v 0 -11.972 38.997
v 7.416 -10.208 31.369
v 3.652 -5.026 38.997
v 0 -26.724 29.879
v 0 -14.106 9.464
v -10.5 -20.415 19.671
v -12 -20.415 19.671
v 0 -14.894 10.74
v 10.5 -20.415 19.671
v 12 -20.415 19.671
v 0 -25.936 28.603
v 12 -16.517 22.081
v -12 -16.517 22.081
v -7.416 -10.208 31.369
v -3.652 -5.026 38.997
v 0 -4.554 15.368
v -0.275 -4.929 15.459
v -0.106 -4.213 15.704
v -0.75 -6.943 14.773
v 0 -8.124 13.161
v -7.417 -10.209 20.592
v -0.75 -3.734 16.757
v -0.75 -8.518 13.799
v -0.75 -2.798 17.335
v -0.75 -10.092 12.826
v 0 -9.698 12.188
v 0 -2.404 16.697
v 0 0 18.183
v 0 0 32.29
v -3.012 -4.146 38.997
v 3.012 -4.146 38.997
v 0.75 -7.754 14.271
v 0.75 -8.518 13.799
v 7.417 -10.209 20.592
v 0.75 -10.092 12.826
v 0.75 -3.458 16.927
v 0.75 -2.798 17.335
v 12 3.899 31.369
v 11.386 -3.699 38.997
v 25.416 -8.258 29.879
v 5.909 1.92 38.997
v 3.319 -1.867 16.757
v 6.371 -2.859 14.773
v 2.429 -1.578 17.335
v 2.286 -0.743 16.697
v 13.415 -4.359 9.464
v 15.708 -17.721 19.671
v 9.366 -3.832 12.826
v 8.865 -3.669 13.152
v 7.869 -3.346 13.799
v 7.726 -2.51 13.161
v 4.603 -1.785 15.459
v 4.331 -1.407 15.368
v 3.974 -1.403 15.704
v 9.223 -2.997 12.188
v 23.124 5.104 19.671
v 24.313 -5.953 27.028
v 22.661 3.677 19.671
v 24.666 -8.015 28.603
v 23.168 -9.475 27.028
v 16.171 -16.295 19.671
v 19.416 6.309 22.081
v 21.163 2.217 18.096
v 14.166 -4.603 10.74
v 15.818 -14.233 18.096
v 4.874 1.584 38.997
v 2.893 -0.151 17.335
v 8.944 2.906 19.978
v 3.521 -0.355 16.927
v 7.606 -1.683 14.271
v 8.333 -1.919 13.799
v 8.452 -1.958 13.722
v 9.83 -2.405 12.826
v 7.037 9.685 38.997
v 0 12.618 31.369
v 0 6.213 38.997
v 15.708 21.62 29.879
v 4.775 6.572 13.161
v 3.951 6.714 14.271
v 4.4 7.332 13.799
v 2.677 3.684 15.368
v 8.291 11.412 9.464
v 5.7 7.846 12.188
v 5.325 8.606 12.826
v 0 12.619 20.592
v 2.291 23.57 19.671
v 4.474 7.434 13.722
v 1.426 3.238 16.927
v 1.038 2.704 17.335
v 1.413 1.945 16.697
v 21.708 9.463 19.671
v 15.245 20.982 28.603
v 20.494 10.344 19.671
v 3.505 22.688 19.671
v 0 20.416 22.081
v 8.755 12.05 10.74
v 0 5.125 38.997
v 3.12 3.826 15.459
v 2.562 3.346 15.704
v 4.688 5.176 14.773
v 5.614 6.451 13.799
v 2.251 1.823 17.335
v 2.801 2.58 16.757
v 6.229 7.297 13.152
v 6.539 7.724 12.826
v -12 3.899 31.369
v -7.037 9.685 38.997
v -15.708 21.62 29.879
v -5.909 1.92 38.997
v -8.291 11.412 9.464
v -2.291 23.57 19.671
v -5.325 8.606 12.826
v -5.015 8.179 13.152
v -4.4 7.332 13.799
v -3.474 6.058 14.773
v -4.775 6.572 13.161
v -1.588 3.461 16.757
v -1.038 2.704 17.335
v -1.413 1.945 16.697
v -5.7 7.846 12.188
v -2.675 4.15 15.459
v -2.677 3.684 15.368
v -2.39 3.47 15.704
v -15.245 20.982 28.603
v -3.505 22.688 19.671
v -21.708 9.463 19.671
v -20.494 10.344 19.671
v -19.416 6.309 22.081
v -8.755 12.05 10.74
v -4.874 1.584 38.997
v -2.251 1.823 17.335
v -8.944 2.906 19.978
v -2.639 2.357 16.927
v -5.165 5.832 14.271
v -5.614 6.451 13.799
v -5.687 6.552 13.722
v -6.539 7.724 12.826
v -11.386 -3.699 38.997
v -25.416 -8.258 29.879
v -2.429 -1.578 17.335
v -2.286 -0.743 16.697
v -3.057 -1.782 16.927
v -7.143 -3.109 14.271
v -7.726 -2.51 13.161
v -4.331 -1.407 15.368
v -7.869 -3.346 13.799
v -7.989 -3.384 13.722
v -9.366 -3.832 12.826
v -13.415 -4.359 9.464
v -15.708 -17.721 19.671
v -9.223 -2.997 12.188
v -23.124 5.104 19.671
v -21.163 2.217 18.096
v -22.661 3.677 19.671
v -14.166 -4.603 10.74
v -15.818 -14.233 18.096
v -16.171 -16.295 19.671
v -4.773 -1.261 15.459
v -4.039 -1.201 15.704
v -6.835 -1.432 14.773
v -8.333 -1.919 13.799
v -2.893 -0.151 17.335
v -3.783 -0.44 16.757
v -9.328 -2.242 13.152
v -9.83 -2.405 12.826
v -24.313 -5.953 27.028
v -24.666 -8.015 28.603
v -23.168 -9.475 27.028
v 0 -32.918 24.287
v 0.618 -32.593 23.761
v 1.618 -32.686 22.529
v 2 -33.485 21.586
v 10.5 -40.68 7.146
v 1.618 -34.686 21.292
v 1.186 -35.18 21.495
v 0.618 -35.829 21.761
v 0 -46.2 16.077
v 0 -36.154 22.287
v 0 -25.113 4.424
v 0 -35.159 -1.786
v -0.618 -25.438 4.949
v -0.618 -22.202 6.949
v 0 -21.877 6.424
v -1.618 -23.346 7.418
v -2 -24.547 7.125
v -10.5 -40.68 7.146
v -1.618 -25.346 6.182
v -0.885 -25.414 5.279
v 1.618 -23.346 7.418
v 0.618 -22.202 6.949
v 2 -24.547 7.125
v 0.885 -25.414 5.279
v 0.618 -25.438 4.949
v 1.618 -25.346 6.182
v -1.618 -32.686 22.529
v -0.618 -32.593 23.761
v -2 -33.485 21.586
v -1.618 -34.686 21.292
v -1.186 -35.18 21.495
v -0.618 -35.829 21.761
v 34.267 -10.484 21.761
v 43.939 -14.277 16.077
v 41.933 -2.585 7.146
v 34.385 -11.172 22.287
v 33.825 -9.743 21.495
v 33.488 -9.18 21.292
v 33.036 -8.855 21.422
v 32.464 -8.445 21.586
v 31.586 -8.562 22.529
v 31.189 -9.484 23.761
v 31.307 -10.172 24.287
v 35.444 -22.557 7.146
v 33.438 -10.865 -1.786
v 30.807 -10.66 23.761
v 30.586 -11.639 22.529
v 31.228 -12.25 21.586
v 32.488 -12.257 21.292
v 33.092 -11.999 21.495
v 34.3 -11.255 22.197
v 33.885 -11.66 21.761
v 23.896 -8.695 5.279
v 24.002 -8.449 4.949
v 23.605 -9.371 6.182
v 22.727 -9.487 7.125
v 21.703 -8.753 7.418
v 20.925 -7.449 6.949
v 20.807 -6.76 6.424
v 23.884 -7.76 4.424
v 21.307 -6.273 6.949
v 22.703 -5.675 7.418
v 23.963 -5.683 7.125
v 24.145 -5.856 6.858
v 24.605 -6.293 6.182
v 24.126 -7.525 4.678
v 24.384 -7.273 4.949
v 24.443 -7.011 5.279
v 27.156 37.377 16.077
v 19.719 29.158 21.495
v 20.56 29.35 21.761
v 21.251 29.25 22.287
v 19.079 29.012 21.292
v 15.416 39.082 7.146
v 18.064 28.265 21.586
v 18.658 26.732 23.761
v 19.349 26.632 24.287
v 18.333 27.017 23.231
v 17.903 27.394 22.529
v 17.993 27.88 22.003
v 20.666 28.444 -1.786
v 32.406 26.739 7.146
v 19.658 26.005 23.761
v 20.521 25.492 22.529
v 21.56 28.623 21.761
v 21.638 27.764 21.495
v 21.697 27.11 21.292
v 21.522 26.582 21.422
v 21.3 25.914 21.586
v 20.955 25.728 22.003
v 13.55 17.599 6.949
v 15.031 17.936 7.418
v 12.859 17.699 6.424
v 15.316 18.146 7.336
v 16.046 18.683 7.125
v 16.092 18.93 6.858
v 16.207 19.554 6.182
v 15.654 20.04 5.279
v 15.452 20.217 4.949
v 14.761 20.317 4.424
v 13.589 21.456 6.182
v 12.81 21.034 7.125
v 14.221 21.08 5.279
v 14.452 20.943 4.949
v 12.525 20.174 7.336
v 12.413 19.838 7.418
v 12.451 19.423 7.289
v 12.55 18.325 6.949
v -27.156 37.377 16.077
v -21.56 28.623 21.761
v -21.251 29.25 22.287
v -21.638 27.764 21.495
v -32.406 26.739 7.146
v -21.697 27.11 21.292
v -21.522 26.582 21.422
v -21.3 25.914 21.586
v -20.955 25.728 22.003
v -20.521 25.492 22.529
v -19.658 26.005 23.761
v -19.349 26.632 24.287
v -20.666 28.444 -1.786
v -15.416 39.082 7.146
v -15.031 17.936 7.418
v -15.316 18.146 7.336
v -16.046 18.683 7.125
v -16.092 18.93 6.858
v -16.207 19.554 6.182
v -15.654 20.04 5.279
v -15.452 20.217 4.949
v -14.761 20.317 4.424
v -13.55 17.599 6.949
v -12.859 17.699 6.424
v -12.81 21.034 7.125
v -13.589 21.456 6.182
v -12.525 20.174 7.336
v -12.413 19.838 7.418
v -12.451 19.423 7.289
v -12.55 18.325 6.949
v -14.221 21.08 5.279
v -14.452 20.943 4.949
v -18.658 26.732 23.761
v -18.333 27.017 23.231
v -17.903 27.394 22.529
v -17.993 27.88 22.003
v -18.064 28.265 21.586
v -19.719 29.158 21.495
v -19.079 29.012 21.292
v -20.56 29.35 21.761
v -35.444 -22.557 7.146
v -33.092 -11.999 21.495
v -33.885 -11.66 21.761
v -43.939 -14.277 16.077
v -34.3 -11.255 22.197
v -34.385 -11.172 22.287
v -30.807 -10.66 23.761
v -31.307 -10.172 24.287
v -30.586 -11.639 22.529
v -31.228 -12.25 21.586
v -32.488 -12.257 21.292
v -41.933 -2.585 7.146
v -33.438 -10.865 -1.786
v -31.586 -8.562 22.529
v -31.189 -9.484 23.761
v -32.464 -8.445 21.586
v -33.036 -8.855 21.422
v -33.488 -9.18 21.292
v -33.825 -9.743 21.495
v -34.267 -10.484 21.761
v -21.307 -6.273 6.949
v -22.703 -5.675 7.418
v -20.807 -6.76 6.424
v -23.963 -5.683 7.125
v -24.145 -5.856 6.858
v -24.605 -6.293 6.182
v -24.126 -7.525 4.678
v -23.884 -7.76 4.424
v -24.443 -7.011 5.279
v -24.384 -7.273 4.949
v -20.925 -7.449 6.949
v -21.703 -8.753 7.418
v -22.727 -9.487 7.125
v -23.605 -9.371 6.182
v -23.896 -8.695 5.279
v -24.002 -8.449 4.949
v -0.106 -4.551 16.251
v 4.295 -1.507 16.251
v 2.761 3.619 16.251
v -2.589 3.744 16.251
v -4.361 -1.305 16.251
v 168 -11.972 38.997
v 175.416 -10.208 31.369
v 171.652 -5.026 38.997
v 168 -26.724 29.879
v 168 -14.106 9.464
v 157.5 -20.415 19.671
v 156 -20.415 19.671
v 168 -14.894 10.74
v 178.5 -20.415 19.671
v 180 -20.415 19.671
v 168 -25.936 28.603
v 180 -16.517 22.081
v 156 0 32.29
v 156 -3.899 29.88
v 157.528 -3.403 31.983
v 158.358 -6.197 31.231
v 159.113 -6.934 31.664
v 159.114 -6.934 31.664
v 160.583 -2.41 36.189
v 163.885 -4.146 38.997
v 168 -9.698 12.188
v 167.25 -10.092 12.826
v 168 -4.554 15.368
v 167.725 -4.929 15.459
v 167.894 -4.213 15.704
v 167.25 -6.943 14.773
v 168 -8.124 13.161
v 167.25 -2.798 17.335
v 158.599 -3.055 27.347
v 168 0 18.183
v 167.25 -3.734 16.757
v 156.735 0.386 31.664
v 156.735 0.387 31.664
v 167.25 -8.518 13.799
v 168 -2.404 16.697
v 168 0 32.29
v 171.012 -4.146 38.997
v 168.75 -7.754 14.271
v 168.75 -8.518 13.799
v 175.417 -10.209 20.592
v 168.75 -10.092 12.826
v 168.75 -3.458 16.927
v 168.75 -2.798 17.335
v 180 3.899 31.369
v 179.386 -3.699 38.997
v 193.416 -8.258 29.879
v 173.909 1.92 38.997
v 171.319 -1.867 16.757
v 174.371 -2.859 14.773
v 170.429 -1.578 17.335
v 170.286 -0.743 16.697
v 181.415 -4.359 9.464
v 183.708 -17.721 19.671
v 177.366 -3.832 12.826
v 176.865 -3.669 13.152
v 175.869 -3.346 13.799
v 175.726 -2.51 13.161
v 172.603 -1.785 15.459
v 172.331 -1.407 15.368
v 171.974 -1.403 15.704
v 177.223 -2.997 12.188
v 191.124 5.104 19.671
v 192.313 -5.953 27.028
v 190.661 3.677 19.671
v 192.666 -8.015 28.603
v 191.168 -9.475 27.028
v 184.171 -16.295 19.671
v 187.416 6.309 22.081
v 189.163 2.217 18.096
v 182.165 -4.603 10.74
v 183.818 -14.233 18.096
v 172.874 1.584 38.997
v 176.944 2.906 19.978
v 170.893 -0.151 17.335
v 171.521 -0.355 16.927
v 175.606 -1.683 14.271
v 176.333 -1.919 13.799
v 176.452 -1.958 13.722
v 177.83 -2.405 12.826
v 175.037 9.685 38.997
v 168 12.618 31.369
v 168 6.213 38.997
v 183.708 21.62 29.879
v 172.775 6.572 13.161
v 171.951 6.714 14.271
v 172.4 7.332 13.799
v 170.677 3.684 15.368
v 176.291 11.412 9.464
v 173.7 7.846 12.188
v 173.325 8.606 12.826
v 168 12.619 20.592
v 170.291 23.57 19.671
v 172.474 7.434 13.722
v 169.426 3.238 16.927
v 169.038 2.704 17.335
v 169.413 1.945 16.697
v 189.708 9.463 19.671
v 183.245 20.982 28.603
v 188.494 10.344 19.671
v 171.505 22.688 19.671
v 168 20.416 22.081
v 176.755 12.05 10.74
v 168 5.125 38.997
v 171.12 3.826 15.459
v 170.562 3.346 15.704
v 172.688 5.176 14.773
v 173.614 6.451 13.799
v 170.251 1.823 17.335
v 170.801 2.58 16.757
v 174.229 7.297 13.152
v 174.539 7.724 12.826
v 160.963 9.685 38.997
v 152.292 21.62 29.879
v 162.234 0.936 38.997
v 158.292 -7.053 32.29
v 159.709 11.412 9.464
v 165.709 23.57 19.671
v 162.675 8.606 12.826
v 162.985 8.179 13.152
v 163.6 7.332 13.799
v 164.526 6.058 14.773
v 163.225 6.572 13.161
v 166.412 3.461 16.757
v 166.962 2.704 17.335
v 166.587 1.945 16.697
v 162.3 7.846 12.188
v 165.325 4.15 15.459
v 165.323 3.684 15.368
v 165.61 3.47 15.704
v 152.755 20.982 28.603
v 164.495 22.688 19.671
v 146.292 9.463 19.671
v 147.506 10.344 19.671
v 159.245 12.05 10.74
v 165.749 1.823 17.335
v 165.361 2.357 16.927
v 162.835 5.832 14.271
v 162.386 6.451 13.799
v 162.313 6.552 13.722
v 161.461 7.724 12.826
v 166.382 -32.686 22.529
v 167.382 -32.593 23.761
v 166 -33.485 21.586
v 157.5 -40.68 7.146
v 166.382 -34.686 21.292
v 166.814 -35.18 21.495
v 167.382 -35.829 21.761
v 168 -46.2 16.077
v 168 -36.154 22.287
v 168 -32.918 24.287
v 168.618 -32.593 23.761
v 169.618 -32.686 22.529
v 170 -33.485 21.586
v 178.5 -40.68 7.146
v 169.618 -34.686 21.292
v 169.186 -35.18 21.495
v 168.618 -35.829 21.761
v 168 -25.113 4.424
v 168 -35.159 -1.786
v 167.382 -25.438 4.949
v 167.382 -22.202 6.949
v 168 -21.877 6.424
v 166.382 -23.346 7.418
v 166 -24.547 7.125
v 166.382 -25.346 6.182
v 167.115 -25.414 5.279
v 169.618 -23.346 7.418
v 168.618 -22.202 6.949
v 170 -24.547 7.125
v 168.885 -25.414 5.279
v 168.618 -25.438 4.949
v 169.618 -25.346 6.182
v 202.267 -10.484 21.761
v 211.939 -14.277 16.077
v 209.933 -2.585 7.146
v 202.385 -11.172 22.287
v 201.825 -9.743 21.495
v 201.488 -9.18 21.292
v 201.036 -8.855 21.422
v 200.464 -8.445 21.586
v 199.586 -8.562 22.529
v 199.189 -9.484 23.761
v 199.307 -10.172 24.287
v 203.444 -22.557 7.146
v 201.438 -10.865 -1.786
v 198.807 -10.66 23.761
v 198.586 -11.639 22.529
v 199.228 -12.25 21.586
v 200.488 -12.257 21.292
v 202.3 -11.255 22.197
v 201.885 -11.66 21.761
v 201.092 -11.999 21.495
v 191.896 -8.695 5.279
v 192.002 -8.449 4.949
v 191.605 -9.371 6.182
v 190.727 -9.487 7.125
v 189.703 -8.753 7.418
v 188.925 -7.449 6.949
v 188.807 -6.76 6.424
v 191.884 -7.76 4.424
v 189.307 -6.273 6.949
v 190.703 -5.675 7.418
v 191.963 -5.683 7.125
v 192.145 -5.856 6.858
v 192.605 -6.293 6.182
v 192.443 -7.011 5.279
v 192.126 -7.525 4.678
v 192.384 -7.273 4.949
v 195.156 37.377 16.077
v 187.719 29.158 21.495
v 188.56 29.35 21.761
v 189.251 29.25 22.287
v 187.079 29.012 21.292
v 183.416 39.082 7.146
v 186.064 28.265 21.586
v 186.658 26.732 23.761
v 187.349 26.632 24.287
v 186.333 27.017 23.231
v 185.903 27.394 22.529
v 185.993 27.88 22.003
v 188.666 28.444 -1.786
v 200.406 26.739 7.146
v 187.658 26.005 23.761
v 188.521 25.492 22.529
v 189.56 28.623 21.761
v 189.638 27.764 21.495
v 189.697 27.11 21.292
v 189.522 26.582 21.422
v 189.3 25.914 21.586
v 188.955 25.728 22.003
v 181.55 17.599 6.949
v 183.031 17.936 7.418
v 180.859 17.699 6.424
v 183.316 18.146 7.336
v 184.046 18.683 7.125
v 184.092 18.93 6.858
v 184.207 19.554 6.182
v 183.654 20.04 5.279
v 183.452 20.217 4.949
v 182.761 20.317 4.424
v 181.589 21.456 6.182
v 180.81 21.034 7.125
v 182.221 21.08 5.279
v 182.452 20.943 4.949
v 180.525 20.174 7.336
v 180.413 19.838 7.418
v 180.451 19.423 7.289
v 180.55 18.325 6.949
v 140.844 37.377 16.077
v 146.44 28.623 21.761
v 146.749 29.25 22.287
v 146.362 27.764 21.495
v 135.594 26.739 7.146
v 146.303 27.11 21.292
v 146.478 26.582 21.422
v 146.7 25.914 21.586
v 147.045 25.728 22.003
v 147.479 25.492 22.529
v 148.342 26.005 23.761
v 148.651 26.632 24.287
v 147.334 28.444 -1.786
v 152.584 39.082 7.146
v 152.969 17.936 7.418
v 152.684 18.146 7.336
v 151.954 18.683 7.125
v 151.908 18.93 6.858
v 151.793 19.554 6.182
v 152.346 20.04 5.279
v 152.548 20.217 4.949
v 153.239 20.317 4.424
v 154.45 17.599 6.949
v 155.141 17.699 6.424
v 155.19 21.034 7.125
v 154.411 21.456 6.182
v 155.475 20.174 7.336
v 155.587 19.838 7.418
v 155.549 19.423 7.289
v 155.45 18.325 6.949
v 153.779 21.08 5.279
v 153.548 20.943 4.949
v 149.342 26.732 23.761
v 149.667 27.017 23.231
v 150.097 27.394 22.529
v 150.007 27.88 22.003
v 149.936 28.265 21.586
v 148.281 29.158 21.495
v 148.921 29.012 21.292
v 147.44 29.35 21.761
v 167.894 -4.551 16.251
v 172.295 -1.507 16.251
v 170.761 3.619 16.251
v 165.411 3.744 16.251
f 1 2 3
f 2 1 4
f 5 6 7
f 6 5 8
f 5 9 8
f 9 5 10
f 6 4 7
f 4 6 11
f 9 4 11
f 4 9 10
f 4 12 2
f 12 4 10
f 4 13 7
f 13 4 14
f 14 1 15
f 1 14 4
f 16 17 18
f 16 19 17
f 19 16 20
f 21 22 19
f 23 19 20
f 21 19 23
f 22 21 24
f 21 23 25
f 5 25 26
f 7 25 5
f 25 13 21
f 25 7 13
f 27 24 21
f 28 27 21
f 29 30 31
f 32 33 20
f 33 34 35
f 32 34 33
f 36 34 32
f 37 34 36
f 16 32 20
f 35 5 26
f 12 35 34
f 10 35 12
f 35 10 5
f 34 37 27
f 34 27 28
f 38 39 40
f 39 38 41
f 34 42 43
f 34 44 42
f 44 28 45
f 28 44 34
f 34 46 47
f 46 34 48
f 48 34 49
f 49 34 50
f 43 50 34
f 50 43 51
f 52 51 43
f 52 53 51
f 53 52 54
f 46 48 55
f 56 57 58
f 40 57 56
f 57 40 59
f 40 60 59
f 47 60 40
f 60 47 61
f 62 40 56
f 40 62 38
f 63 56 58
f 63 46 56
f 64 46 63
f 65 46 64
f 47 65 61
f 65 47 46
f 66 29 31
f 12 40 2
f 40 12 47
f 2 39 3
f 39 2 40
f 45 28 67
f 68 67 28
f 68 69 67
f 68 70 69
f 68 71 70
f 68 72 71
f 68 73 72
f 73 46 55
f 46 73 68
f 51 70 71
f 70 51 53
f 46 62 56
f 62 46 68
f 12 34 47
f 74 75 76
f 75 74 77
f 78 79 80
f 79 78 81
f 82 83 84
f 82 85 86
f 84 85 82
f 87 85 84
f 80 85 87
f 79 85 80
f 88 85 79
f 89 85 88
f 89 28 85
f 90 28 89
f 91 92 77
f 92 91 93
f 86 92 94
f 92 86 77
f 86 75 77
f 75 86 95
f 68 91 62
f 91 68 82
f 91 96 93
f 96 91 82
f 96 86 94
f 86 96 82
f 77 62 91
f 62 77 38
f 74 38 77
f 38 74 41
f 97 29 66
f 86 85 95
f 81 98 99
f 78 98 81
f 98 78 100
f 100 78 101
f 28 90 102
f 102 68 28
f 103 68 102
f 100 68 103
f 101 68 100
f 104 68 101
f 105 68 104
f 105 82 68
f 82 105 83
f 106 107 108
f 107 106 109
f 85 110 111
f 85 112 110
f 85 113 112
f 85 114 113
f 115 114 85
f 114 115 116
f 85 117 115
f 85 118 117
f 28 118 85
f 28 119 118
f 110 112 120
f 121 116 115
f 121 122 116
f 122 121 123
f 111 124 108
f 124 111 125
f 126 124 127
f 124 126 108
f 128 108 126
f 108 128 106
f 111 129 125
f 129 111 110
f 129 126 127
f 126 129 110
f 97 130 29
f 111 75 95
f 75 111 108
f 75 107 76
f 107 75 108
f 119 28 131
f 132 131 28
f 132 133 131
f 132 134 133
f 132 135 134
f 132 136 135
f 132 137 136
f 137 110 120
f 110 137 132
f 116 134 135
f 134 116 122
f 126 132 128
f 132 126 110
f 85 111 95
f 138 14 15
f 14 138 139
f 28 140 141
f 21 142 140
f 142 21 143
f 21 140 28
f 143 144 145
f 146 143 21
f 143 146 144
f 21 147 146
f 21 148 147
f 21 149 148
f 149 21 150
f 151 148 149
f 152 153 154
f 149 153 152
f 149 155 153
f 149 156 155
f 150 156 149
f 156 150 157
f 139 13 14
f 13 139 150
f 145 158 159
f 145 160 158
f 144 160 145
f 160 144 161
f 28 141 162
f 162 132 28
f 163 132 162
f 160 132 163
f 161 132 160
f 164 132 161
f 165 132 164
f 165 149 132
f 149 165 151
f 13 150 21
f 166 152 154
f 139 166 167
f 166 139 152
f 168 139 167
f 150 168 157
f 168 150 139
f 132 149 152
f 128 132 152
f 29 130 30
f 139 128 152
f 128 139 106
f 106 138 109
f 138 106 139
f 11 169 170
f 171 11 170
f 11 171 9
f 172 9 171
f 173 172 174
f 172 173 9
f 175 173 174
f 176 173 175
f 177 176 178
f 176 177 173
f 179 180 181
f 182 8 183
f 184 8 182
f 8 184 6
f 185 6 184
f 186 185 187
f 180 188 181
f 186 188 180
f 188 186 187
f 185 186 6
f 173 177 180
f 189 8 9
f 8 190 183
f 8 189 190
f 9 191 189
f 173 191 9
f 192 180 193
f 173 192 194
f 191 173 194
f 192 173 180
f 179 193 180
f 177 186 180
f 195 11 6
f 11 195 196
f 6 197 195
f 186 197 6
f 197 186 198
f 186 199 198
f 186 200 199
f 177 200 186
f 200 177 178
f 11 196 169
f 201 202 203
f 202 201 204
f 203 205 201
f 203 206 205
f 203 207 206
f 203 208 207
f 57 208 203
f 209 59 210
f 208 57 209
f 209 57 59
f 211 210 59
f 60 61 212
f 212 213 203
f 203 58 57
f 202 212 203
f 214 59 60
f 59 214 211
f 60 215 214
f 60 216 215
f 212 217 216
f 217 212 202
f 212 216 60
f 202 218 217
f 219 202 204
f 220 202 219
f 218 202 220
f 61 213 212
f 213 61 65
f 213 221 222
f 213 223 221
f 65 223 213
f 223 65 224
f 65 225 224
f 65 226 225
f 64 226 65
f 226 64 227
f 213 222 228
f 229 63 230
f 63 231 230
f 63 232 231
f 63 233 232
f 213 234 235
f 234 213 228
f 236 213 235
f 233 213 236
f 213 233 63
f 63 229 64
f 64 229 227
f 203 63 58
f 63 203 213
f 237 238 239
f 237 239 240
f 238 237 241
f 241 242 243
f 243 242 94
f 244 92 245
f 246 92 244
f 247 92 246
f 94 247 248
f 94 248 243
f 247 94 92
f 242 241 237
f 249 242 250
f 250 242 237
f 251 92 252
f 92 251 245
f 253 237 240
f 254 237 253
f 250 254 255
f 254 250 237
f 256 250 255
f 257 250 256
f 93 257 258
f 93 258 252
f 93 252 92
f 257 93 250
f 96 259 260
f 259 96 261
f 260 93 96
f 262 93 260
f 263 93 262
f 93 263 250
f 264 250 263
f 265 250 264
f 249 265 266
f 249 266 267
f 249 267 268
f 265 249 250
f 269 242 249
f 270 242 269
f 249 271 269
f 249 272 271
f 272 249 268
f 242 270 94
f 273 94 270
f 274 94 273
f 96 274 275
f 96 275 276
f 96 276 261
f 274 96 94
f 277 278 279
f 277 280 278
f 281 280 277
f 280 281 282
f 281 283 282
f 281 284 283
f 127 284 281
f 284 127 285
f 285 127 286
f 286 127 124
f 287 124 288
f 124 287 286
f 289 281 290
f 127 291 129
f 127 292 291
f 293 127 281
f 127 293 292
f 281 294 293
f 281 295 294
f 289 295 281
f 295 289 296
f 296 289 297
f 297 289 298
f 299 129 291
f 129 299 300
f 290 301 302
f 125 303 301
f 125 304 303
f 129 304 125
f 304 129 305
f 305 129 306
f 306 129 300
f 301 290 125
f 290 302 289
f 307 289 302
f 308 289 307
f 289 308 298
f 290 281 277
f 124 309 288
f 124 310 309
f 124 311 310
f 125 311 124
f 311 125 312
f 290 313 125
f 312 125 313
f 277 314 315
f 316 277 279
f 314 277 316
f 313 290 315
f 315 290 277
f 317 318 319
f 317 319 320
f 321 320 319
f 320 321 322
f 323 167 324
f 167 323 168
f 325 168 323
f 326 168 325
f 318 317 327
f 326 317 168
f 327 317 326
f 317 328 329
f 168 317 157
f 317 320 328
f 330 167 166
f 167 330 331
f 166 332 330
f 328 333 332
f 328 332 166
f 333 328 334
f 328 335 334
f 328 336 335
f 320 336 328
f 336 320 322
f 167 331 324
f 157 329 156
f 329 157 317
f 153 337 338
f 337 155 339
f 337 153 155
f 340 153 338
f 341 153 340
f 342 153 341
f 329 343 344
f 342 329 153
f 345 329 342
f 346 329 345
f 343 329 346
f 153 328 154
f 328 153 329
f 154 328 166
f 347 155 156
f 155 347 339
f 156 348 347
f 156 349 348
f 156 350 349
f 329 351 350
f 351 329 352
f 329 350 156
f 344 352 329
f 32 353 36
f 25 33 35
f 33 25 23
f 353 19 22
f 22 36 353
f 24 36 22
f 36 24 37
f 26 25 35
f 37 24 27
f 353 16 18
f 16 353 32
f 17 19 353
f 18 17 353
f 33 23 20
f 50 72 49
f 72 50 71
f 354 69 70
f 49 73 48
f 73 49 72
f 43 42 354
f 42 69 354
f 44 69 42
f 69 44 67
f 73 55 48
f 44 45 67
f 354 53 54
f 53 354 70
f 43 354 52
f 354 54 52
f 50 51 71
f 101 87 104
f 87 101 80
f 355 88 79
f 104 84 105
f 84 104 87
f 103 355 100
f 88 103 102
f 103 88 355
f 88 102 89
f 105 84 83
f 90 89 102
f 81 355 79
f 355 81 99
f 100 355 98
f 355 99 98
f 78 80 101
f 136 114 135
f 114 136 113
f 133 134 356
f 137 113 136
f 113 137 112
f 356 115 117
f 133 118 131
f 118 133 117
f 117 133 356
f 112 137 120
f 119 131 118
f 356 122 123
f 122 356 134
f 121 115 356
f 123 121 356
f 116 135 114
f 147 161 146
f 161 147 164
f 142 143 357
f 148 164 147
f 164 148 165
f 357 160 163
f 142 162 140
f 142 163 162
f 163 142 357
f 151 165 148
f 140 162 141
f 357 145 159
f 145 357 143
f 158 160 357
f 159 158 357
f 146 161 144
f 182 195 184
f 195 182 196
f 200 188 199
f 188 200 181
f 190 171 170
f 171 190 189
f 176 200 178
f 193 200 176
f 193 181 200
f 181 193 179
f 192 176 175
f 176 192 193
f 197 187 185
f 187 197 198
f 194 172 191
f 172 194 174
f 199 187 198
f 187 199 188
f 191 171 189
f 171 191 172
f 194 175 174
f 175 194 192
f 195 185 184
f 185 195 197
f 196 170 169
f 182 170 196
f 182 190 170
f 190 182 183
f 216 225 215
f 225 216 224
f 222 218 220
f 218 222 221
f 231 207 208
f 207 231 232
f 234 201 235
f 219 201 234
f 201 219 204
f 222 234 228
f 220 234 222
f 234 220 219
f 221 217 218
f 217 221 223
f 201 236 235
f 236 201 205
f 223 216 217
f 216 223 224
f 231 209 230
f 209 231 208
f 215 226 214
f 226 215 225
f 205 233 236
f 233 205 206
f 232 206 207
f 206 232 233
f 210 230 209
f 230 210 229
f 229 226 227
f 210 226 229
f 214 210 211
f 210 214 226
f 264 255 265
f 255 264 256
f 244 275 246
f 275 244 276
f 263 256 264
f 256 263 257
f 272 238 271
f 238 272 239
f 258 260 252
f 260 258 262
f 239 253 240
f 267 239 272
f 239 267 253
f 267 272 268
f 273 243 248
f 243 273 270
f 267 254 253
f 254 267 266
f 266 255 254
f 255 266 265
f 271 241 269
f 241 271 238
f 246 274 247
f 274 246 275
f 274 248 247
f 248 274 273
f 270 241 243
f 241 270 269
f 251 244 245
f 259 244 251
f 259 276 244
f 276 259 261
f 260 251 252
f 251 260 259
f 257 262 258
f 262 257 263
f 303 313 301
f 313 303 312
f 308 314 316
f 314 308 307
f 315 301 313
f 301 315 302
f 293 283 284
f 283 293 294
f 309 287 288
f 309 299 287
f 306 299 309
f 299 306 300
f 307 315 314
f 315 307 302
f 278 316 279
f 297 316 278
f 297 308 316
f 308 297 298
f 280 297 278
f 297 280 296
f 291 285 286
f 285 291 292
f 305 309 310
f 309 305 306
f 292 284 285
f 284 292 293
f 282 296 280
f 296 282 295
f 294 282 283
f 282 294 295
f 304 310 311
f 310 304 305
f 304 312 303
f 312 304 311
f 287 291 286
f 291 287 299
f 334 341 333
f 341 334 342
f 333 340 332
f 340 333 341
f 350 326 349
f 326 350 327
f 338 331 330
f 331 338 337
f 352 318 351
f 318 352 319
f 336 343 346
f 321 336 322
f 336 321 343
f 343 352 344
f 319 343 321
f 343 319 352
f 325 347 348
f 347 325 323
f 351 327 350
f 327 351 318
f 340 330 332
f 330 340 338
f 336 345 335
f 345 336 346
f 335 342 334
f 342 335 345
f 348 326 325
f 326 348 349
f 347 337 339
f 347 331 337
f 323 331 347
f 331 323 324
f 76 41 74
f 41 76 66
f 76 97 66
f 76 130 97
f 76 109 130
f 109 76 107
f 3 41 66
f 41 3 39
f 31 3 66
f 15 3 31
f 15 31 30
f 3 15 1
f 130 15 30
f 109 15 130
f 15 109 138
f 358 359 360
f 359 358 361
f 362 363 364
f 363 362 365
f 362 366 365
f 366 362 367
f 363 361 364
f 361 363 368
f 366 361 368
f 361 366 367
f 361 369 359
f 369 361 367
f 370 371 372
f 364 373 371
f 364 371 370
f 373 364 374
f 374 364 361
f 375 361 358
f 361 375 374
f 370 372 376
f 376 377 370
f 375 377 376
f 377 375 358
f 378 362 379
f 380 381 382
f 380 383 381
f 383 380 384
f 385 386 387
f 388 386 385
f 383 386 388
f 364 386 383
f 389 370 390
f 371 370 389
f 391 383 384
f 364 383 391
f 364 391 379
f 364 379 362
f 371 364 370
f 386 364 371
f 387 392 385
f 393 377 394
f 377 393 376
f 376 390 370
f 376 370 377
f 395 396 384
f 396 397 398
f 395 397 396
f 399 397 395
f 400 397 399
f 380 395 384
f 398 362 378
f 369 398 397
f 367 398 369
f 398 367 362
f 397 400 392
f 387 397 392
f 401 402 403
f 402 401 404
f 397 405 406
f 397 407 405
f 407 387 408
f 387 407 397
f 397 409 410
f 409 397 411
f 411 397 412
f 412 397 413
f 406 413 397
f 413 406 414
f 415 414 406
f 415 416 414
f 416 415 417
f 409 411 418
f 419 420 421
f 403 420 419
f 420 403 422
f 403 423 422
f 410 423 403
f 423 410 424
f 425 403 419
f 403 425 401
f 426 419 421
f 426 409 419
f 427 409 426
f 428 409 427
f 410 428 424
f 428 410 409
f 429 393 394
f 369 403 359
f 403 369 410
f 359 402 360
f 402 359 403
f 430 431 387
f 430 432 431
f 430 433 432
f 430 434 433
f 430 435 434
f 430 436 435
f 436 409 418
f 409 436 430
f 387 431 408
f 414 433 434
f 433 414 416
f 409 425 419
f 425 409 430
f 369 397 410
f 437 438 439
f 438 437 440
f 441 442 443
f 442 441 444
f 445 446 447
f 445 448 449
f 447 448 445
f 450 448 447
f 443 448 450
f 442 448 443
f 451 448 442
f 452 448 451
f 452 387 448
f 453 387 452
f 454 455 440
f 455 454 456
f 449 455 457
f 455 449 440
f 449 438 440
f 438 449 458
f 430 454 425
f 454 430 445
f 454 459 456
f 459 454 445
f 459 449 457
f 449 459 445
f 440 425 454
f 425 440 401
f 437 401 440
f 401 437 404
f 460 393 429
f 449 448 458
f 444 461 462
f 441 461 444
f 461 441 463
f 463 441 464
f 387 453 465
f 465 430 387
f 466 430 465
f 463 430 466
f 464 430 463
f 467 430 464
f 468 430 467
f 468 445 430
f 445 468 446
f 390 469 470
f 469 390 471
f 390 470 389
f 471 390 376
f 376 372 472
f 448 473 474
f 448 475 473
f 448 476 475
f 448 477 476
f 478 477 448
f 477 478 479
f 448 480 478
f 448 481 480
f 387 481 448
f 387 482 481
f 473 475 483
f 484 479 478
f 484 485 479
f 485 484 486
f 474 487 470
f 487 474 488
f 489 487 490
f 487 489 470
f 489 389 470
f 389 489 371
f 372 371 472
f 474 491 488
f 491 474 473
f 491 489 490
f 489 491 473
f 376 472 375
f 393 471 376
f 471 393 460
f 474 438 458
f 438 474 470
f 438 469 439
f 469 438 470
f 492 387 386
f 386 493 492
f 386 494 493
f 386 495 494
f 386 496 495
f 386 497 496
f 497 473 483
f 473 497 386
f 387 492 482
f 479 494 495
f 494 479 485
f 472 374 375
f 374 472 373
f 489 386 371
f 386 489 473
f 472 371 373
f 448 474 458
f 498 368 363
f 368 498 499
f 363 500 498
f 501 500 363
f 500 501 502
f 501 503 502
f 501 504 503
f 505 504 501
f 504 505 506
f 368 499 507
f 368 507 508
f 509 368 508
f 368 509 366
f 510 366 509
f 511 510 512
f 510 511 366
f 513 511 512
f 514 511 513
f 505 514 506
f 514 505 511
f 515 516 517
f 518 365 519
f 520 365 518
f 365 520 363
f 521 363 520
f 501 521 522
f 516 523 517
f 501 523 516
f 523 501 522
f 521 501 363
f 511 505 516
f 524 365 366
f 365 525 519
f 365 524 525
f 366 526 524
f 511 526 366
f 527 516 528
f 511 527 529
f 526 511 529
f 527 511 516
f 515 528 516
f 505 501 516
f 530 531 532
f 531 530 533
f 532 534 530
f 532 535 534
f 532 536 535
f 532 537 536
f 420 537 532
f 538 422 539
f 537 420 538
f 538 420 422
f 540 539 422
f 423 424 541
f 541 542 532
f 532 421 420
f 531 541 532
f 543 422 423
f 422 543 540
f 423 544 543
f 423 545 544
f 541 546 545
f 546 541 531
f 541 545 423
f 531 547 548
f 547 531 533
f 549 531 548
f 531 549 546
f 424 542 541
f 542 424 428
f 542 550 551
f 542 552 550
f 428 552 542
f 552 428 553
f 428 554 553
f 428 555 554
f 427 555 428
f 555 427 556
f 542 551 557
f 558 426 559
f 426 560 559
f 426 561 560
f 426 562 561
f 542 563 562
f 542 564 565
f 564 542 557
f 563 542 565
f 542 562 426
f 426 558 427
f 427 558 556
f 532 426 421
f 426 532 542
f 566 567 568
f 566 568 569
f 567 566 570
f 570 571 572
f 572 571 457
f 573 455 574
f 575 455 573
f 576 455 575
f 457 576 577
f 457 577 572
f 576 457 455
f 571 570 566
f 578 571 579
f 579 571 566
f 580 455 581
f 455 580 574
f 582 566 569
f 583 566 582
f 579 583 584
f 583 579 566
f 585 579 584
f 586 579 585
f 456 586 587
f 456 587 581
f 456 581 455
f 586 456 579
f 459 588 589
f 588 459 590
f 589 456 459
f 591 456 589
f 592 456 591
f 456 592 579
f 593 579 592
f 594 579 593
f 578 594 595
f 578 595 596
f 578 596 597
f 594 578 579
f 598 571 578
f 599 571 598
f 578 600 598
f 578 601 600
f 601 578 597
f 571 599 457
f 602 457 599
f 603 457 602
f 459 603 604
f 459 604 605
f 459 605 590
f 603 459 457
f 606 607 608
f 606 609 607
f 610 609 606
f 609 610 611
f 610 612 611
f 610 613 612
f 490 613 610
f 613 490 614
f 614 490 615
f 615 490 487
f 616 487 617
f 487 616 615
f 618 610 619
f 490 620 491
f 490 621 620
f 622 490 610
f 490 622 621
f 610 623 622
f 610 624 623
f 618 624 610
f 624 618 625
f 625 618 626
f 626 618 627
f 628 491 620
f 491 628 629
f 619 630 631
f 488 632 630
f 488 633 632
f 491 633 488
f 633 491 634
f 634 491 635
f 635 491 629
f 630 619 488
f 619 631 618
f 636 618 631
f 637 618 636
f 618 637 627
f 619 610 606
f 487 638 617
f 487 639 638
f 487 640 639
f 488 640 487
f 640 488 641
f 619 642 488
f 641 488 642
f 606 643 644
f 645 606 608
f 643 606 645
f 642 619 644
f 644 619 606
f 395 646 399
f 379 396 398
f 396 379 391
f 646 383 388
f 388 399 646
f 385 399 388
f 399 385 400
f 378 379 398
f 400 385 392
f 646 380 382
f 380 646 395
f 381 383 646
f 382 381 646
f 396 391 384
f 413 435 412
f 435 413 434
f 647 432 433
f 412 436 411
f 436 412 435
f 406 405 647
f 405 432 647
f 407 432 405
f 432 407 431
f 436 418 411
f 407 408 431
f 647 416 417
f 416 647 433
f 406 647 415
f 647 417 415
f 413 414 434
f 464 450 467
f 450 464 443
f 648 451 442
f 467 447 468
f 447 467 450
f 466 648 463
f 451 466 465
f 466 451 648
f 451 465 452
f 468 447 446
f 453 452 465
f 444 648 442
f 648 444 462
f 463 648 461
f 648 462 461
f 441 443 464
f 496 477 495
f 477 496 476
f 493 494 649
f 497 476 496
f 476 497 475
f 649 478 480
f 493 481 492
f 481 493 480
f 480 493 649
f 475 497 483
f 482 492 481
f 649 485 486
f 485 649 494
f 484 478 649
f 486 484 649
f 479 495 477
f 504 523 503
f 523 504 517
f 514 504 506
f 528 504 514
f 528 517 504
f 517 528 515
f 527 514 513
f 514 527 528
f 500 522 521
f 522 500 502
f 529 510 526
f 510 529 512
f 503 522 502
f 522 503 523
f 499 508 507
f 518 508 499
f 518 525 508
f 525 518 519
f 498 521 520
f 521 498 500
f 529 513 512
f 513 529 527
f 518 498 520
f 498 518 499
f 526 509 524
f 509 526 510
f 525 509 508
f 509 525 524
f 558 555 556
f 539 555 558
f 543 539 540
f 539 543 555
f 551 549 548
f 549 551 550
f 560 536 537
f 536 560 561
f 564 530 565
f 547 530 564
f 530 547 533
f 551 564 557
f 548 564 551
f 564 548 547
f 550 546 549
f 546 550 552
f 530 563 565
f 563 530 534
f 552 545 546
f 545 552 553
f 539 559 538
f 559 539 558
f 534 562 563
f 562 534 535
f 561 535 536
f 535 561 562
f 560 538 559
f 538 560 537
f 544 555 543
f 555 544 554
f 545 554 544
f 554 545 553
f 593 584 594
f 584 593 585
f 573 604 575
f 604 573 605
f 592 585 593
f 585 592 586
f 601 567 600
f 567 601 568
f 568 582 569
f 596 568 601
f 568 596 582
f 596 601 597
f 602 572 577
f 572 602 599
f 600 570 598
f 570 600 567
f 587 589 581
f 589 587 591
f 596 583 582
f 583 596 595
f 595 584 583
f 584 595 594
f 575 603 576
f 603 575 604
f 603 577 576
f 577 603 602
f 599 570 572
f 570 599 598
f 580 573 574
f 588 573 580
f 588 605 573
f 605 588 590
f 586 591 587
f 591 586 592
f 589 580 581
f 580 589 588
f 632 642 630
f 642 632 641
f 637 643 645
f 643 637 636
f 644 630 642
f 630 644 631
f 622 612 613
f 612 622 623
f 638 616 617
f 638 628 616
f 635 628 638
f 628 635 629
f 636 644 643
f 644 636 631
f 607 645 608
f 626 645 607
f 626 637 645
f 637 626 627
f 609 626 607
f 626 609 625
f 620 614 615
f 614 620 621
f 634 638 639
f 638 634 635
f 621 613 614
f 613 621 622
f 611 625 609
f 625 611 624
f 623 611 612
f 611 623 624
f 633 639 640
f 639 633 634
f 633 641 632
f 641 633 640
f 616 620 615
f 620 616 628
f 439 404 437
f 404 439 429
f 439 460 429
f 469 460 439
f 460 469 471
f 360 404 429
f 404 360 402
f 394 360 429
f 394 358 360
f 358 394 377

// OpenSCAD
// Based on the info from https://www.domerama.com/calculators/

DEBUG = false;

$fn = 10;
dome_frequency = "1V";  // [1V, 2V, 3V3/8, 5V Mexican]
hub_body_type = "pipe"; // [pipe, solid]
strut_thikness = 1.5;
strut_inner_diameter = 21;
screw_holde_diameter = 4;
strut_edge_geometry = 4;

/* [Hidden] */
font_size = (strut_inner_diameter + strut_thikness) / 2;
hub_diameter = strut_inner_diameter * 4;
hub_radius = hub_diameter / 2;
strut_radius = strut_inner_diameter / 2;
render_all_spacing = strut_inner_diameter * 8;
strut_hub_center_offset = 9 * strut_inner_diameter / 10;
// Strut socket angles
freq_1V_strut_angles = [[ "A", 31.72 ]];
freq_2V_strut_angles = [ [ "A", 15.86 ], [ "B", 18 ] ];
freq_3V_3_8_strut_angles = [ [ "A", 10.04 ], [ "B", 11.64 ], [ "C", 11.90 ] ];
freq_5V_mexican_strut_angles =
    [ [ "A", 12.6 ], [ "B", 12.4 ], [ "C", 11.7 ], [ "D", 10.6 ], [ "E", 9 ] ];

// clang-format off
/* [1V] */
render_1V = "all";// [all, penth, quad]
/* [2V] */
render_2V = "all";// [all, hex, penth, quad_left, quad_right]
/* [3V3/8] */
render_3V_3_8 = "all";// [all, hex1, hex2, penth, quad_left, quad_center, quad_right]
/* [5V Mexican] */
render_5V_mexican = "all";// [all, hex1, hex2, hex3, hex4, full_quad, half_quad1_left, half_quad1_right, half_quad2_left, half_quad2_right, tri]
// clang-format on

// Returns all angles from the frequecy_angles structure in a new array
function get_strut_angles(frequecy_angles) = [for (a = frequecy_angles) a[1]];

// Returns the strut angle for the strut_id from frequecy_angles array
function get_strut_angle(frequecy_angles, strut_id) =
    frequecy_angles[search(strut_id, frequecy_angles)[0]][1];

function get_socket_config_angles(frequency_angles, socket_config) = [for (
    strut_id = socket_config) get_strut_angle(frequency_angles, strut_id)];

// Returns the max circumference angle (in degrees) given it's
// full_hub_sector_count and strut_count
function get_circle_angle(full_hub_sector_count, strut_count) =
    full_hub_sector_count ? 360 / full_hub_sector_count * strut_count : 360;

module translate_to_origin(frequency_angles, socket_config) {
  outer_radius = strut_radius + strut_thikness;
  max_angle = max(get_socket_config_angles(frequency_angles, socket_config));
  origin_offset = outer_radius * cos(max_angle) + hub_radius * sin(max_angle);
  translate([ 0, 0, origin_offset ]) children();
}

module grid_layout(render_what, col, row, coloration) {
  grid = render_what == "all"
             ? [ render_all_spacing * row, render_all_spacing * col, 0 ]
             : [ 0, 0, 0 ];
  translate(grid) color(DEBUG ? undef : coloration) children();
}

// Renders the strut_id letter on the top of the hub
module strut_id_letters(frequency_angles, socket_config,
                        full_hub_sector_count) {
  strut_count = len(socket_config);
  circle_angle = get_circle_angle(full_hub_sector_count, strut_count);
  min_angle = min(get_strut_angles(frequency_angles));

    for (i = [0:strut_count - 1]) {
      strut_angle = get_strut_angle(frequency_angles, socket_config[i]);
      rotate([ -min_angle, 0, 180 + i * circle_angle / strut_count ])
          translate([ 0, (2*strut_thikness + hub_radius) / 2.8, -strut_radius - strut_thikness/2  ]) rotate([180, 0, 0])
              linear_extrude(strut_thikness * 2) {
        text(socket_config[i], size = font_size,
             font = "DejaVu Sans Mono:style=Bold", valign = "center",
             halign = "center");
      }
  }
}

// Renders the screw holes on the bottom of the hub
module screw_holes(frequency_angles, socket_config, full_hub_sector_count) {
  strut_count = len(socket_config);
  circle_angle = get_circle_angle(full_hub_sector_count, strut_count);
  min_angle = max(get_strut_angles(frequency_angles));
  for (i = [0:strut_count - 1]) {
    strut_angle = get_strut_angle(frequency_angles, socket_config[i]);
    for (mult = [2.7:1:2.7]) { // Tweak for multiple screws
      screw_hole_start = -(hub_diameter / mult) * cos(min_angle);
      rotate([ -min_angle, 0, 180 + i * circle_angle / strut_count ])
          translate([ 0, hub_diameter / mult + 2*strut_thikness, screw_hole_start ]) cylinder(
              h = strut_inner_diameter * 3, d = screw_holde_diameter, center = false);
    }
  }
}

module layout_struts(frequency_angles, socket_config, strut_thikness,
                     full_hub_sector_count) {
  strut_count = len(socket_config);
  circle_angle = get_circle_angle(full_hub_sector_count, strut_count);
  for ($i = [0:strut_count - 1]) {
    $strut_angle = get_strut_angle(frequency_angles, socket_config[$i]);
    rotate([ 90 + $strut_angle, 0, $i * circle_angle / strut_count ])
        translate([ 0, 0, strut_hub_center_offset ]) children();
  }
}

// Renders the main body of the hub
module body(frequency_angles, socket_config, full_hub_sector_count) {
    strut_count = len(socket_config);
    circle_angle = get_circle_angle(full_hub_sector_count, strut_count);
    for (i = [0:strut_count - 1]) {
        strut_angle = get_strut_angle(frequency_angles, socket_config[i]);
        rotate([ 90 + strut_angle, 0, i * circle_angle / strut_count ])
            cylinder(h = strut_thikness*2 + hub_radius /2, d = strut_inner_diameter + strut_thikness * 2,
                     center = false, $fn = strut_edge_geometry);
      
    }
  

}

// Renders all the peripheral strut sockets
module peripheral_socket(frequency_angles, socket_config, strut_thikness,
                         full_hub_sector_count) {
  min_angle = min(get_strut_angles(frequency_angles));
  strut_hub_depth =
      hub_radius - strut_hub_center_offset * cos(min_angle) + 2*strut_thikness;
  layout_struts(frequency_angles, socket_config, strut_thikness,
                full_hub_sector_count)
      cylinder(h = strut_hub_depth, d = strut_inner_diameter, center = false,
               $fn = strut_edge_geometry);
}

// Renders a center strut socket
module center_socket(frequency_angles, socket_config,
                     diameter = strut_inner_diameter * 2) {
                         max_angle = max(get_socket_config_angles(frequency_angles, socket_config));
  outer_radius = strut_radius + strut_thikness;
  origin_offset = outer_radius * cos(max_angle) + hub_radius * sin(max_angle);
  offset = outer_radius * cos((max_angle)) - hub_radius /12;
  center_socket_height = origin_offset + offset + strut_thikness / 4;
  translate([ 0, 0, offset ])
      cylinder(h = offset, d = diameter, center = false);

}

module center_reinforcement(frequency_angles, socket_config) {
//  center_socket(frequency_angles, socket_config,
//                strut_inner_diameter + strut_thikness * 2);
}

module bottom_support(frequency_angles, socket_config, full_hub_sector_count) {

}

// Fully renders the hub both in debugging or production modes
module hub(frequency_angles, socket_config, full_hub_sector_count = undef) {
  // Align the hub base with the origin
  translate_to_origin(frequency_angles, socket_config) {
    if (DEBUG) {
      color("grey")
          screw_holes(frequency_angles, socket_config, full_hub_sector_count);
      color([ 0.5, 0.1, 0.5, 0.5 ])
          peripheral_socket(frequency_angles, socket_config, strut_thikness,
                            full_hub_sector_count);
      color("green", 0.5) center_socket(frequency_angles, socket_config);
      color("red") strut_id_letters(frequency_angles, socket_config,
                                    full_hub_sector_count);
      color([ 1, 1, 0, 0.7 ])
          body(frequency_angles, socket_config, full_hub_sector_count);
      color([ 0, 1, 0, 0.7 ]) bottom_support(frequency_angles, socket_config,
                                             full_hub_sector_count);
      color("cyan", 0.5) center_reinforcement(frequency_angles, socket_config);
    } else {
      difference() {
        union() {
          body(frequency_angles, socket_config, full_hub_sector_count);
          center_reinforcement(frequency_angles, socket_config);
          bottom_support(frequency_angles, socket_config,
                         full_hub_sector_count);
          peripheral_socket(frequency_angles, socket_config, strut_thikness,
                         full_hub_sector_count);
        }
        strut_id_letters(frequency_angles, socket_config,
                         full_hub_sector_count);
        center_socket(frequency_angles, socket_config);
        screw_holes(frequency_angles, socket_config, full_hub_sector_count);
               
      }
    }
  }
}

// http://www.domerama.com/calculators/1v-geodesic-dome-calculator/
// A x25
module hubs_1V() {
  // PENTH x6
  if (render_1V == "all" || render_1V == "penth")
    grid_layout(render_1V, 0, 0, "red")
        hub(freq_1V_strut_angles, [ "A", "A", "A", "A", "A" ]);
  // QUAD x5
  if (render_1V == "all" || render_1V == "quad")
    grid_layout(render_1V, 0, 1, "orange")
        hub(freq_1V_strut_angles, [ "A", "A", "A", "A" ], 5);
}

// http://www.domerama.com/calculators/2v-geodesic-dome-calculator/
// A x30
// B x35
module hubs_2V() {
  // HEX x10
  if (render_2V == "all" || render_2V == "hex")
    grid_layout(render_2V, 0, 0, "red")
        hub(freq_2V_strut_angles, [ "A", "B", "B", "A", "B", "B" ]);
  // PENTH x6
  if (render_2V == "all" || render_2V == "penth")
    grid_layout(render_2V, 0, 1, "orange")
        hub(freq_2V_strut_angles, [ "A", "A", "A", "A", "A" ]);
  // QUAD_LEFT x5
  if (render_2V == "all" || render_2V == "quad_left")
    grid_layout(render_2V, 1, 0, "green")
        hub(freq_2V_strut_angles, [ "B", "A", "B", "B" ], 6);
  // QUAD_RIGHT x5
  if (render_2V == "all" || render_2V == "quad_right")
    grid_layout(render_2V, 1, 1, "purple")
        hub(freq_2V_strut_angles, [ "B", "B", "A", "B" ], 6);
}

// TODO: TO TEST
// http://www.domerama.com/calculators/3v-geodesic-dome-calculator/
// (non-flat at base)
// A x30
// B x40
// C x50
module hubs_3V_3_8() {
  // HEX1 x20
  if (render_3V_3_8 == "all" || render_3V_3_8 == "hex1")
    grid_layout(render_3V_3_8, 0, 0, "red")
        hub(freq_3V_3_8_strut_angles, [ "A", "B", "C", "B", "C", "B" ]);
  // HEX2 x5
  if (render_3V_3_8 == "all" || render_3V_3_8 == "hex2")
    grid_layout(render_3V_3_8, 0, 1, "gray")
        hub(freq_3V_3_8_strut_angles, [ "C", "C", "C", "C", "C", "C" ]);
  // PENTH x6
  if (render_3V_3_8 == "all" || render_3V_3_8 == "penth")
    grid_layout(render_3V_3_8, 1, 0, "orange")
        hub(freq_3V_3_8_strut_angles, [ "A", "A", "A", "A", "A" ]);
  // QUAD_LEFT x5
  if (render_3V_3_8 == "all" || render_3V_3_8 == "quad_left")
    grid_layout(render_3V_3_8, 1, 1, "green")
        hub(freq_3V_3_8_strut_angles, [ "B", "A", "B", "C" ], 6);
  // QUAD_CENTER x5
  if (render_3V_3_8 == "all" || render_3V_3_8 == "quad_center")
    grid_layout(render_3V_3_8, 2, 0, "blue")
        hub(freq_3V_3_8_strut_angles, [ "C", "C", "C", "C" ], 6);
  // QUAD_RIGHT x5
  if (render_3V_3_8 == "all" || render_3V_3_8 == "quad_right")
    grid_layout(render_3V_3_8, 2, 1, "purple")
        hub(freq_3V_3_8_strut_angles, [ "C", "B", "A", "B" ], 6);
}

// TODO: TO TEST
// https://www.domerama.com/calculators/octahedral-5v-mexican-method/
// (flat at base)
// A x12
// B x24
// C x36
// D x48
// E x40
module hubs_5V_mexican() {
  // HEX1 x12
  if (render_5V_mexican == "all" || render_5V_mexican == "hex1")
    grid_layout(render_5V_mexican, 0, 0, "red")
        hub(freq_5V_mexican_strut_angles, [ "A", "D", "E", "D", "A", "E" ]);
  // HEX2 x8
  if (render_5V_mexican == "all" || render_5V_mexican == "hex2")
    grid_layout(render_5V_mexican, 0, 1, "gray")
        hub(freq_5V_mexican_strut_angles, [ "B", "C", "E", "C", "B", "E" ]);
  // HEX3 x12
  if (render_5V_mexican == "all" || render_5V_mexican == "hex3")
    grid_layout(render_5V_mexican, 0, 2, "orange")
        hub(freq_5V_mexican_strut_angles, [ "C", "C", "D", "C", "C", "D" ]);
  // HEX4 x12
  if (render_5V_mexican == "all" || render_5V_mexican == "hex4")
    grid_layout(render_5V_mexican, 1, 0, "green")
        hub(freq_5V_mexican_strut_angles, [ "D", "D", "B", "D", "D", "B" ]);
  // FULL_QUAD x1
  if (render_5V_mexican == "all" || render_5V_mexican == "full_quad")
    grid_layout(render_5V_mexican, 1, 1, "blue")
        hub(freq_5V_mexican_strut_angles, [ "E", "E", "E", "E" ]);
  // HALF_QUAD1_LEFT x4
  if (render_5V_mexican == "all" || render_5V_mexican == "half_quad1_left")
    grid_layout(render_5V_mexican, 1, 2, "coral")
        hub(freq_5V_mexican_strut_angles, [ "E", "A", "D", "E" ], 6);
  // HALF_QUAD1_RIGHT x4
  if (render_5V_mexican == "all" || render_5V_mexican == "half_quad1_right")
    grid_layout(render_5V_mexican, 2, 0, "cyan")
        hub(freq_5V_mexican_strut_angles, [ "E", "D", "A", "E" ], 6);
  // HALF_QUAD2_LEFT x4
  if (render_5V_mexican == "all" || render_5V_mexican == "half_quad2_left")
    grid_layout(render_5V_mexican, 2, 1, "pink")
        hub(freq_5V_mexican_strut_angles, [ "E", "B", "C", "E" ], 6);
  // HALF_QUAD2_RIGHT x4
  if (render_5V_mexican == "all" || render_5V_mexican == "half_quad2_right")
    grid_layout(render_5V_mexican, 2, 2, "bisque")
        hub(freq_5V_mexican_strut_angles, [ "E", "C", "B", "E" ], 6);
  // TRI x4
  if (render_5V_mexican == "all" || render_5V_mexican == "tri")
    grid_layout(render_5V_mexican, 3, 0, "purple")
        hub(freq_5V_mexican_strut_angles, [ "E", "E", "E" ], 4);
}

module main() {
  if (dome_frequency == "1V")
    hubs_1V();
  if (dome_frequency == "2V")
    hubs_2V();
  if (dome_frequency == "3V3/8")
    hubs_3V_3_8();
  if (dome_frequency == "5V Mexican")
    hubs_5V_mexican();
}

main();
